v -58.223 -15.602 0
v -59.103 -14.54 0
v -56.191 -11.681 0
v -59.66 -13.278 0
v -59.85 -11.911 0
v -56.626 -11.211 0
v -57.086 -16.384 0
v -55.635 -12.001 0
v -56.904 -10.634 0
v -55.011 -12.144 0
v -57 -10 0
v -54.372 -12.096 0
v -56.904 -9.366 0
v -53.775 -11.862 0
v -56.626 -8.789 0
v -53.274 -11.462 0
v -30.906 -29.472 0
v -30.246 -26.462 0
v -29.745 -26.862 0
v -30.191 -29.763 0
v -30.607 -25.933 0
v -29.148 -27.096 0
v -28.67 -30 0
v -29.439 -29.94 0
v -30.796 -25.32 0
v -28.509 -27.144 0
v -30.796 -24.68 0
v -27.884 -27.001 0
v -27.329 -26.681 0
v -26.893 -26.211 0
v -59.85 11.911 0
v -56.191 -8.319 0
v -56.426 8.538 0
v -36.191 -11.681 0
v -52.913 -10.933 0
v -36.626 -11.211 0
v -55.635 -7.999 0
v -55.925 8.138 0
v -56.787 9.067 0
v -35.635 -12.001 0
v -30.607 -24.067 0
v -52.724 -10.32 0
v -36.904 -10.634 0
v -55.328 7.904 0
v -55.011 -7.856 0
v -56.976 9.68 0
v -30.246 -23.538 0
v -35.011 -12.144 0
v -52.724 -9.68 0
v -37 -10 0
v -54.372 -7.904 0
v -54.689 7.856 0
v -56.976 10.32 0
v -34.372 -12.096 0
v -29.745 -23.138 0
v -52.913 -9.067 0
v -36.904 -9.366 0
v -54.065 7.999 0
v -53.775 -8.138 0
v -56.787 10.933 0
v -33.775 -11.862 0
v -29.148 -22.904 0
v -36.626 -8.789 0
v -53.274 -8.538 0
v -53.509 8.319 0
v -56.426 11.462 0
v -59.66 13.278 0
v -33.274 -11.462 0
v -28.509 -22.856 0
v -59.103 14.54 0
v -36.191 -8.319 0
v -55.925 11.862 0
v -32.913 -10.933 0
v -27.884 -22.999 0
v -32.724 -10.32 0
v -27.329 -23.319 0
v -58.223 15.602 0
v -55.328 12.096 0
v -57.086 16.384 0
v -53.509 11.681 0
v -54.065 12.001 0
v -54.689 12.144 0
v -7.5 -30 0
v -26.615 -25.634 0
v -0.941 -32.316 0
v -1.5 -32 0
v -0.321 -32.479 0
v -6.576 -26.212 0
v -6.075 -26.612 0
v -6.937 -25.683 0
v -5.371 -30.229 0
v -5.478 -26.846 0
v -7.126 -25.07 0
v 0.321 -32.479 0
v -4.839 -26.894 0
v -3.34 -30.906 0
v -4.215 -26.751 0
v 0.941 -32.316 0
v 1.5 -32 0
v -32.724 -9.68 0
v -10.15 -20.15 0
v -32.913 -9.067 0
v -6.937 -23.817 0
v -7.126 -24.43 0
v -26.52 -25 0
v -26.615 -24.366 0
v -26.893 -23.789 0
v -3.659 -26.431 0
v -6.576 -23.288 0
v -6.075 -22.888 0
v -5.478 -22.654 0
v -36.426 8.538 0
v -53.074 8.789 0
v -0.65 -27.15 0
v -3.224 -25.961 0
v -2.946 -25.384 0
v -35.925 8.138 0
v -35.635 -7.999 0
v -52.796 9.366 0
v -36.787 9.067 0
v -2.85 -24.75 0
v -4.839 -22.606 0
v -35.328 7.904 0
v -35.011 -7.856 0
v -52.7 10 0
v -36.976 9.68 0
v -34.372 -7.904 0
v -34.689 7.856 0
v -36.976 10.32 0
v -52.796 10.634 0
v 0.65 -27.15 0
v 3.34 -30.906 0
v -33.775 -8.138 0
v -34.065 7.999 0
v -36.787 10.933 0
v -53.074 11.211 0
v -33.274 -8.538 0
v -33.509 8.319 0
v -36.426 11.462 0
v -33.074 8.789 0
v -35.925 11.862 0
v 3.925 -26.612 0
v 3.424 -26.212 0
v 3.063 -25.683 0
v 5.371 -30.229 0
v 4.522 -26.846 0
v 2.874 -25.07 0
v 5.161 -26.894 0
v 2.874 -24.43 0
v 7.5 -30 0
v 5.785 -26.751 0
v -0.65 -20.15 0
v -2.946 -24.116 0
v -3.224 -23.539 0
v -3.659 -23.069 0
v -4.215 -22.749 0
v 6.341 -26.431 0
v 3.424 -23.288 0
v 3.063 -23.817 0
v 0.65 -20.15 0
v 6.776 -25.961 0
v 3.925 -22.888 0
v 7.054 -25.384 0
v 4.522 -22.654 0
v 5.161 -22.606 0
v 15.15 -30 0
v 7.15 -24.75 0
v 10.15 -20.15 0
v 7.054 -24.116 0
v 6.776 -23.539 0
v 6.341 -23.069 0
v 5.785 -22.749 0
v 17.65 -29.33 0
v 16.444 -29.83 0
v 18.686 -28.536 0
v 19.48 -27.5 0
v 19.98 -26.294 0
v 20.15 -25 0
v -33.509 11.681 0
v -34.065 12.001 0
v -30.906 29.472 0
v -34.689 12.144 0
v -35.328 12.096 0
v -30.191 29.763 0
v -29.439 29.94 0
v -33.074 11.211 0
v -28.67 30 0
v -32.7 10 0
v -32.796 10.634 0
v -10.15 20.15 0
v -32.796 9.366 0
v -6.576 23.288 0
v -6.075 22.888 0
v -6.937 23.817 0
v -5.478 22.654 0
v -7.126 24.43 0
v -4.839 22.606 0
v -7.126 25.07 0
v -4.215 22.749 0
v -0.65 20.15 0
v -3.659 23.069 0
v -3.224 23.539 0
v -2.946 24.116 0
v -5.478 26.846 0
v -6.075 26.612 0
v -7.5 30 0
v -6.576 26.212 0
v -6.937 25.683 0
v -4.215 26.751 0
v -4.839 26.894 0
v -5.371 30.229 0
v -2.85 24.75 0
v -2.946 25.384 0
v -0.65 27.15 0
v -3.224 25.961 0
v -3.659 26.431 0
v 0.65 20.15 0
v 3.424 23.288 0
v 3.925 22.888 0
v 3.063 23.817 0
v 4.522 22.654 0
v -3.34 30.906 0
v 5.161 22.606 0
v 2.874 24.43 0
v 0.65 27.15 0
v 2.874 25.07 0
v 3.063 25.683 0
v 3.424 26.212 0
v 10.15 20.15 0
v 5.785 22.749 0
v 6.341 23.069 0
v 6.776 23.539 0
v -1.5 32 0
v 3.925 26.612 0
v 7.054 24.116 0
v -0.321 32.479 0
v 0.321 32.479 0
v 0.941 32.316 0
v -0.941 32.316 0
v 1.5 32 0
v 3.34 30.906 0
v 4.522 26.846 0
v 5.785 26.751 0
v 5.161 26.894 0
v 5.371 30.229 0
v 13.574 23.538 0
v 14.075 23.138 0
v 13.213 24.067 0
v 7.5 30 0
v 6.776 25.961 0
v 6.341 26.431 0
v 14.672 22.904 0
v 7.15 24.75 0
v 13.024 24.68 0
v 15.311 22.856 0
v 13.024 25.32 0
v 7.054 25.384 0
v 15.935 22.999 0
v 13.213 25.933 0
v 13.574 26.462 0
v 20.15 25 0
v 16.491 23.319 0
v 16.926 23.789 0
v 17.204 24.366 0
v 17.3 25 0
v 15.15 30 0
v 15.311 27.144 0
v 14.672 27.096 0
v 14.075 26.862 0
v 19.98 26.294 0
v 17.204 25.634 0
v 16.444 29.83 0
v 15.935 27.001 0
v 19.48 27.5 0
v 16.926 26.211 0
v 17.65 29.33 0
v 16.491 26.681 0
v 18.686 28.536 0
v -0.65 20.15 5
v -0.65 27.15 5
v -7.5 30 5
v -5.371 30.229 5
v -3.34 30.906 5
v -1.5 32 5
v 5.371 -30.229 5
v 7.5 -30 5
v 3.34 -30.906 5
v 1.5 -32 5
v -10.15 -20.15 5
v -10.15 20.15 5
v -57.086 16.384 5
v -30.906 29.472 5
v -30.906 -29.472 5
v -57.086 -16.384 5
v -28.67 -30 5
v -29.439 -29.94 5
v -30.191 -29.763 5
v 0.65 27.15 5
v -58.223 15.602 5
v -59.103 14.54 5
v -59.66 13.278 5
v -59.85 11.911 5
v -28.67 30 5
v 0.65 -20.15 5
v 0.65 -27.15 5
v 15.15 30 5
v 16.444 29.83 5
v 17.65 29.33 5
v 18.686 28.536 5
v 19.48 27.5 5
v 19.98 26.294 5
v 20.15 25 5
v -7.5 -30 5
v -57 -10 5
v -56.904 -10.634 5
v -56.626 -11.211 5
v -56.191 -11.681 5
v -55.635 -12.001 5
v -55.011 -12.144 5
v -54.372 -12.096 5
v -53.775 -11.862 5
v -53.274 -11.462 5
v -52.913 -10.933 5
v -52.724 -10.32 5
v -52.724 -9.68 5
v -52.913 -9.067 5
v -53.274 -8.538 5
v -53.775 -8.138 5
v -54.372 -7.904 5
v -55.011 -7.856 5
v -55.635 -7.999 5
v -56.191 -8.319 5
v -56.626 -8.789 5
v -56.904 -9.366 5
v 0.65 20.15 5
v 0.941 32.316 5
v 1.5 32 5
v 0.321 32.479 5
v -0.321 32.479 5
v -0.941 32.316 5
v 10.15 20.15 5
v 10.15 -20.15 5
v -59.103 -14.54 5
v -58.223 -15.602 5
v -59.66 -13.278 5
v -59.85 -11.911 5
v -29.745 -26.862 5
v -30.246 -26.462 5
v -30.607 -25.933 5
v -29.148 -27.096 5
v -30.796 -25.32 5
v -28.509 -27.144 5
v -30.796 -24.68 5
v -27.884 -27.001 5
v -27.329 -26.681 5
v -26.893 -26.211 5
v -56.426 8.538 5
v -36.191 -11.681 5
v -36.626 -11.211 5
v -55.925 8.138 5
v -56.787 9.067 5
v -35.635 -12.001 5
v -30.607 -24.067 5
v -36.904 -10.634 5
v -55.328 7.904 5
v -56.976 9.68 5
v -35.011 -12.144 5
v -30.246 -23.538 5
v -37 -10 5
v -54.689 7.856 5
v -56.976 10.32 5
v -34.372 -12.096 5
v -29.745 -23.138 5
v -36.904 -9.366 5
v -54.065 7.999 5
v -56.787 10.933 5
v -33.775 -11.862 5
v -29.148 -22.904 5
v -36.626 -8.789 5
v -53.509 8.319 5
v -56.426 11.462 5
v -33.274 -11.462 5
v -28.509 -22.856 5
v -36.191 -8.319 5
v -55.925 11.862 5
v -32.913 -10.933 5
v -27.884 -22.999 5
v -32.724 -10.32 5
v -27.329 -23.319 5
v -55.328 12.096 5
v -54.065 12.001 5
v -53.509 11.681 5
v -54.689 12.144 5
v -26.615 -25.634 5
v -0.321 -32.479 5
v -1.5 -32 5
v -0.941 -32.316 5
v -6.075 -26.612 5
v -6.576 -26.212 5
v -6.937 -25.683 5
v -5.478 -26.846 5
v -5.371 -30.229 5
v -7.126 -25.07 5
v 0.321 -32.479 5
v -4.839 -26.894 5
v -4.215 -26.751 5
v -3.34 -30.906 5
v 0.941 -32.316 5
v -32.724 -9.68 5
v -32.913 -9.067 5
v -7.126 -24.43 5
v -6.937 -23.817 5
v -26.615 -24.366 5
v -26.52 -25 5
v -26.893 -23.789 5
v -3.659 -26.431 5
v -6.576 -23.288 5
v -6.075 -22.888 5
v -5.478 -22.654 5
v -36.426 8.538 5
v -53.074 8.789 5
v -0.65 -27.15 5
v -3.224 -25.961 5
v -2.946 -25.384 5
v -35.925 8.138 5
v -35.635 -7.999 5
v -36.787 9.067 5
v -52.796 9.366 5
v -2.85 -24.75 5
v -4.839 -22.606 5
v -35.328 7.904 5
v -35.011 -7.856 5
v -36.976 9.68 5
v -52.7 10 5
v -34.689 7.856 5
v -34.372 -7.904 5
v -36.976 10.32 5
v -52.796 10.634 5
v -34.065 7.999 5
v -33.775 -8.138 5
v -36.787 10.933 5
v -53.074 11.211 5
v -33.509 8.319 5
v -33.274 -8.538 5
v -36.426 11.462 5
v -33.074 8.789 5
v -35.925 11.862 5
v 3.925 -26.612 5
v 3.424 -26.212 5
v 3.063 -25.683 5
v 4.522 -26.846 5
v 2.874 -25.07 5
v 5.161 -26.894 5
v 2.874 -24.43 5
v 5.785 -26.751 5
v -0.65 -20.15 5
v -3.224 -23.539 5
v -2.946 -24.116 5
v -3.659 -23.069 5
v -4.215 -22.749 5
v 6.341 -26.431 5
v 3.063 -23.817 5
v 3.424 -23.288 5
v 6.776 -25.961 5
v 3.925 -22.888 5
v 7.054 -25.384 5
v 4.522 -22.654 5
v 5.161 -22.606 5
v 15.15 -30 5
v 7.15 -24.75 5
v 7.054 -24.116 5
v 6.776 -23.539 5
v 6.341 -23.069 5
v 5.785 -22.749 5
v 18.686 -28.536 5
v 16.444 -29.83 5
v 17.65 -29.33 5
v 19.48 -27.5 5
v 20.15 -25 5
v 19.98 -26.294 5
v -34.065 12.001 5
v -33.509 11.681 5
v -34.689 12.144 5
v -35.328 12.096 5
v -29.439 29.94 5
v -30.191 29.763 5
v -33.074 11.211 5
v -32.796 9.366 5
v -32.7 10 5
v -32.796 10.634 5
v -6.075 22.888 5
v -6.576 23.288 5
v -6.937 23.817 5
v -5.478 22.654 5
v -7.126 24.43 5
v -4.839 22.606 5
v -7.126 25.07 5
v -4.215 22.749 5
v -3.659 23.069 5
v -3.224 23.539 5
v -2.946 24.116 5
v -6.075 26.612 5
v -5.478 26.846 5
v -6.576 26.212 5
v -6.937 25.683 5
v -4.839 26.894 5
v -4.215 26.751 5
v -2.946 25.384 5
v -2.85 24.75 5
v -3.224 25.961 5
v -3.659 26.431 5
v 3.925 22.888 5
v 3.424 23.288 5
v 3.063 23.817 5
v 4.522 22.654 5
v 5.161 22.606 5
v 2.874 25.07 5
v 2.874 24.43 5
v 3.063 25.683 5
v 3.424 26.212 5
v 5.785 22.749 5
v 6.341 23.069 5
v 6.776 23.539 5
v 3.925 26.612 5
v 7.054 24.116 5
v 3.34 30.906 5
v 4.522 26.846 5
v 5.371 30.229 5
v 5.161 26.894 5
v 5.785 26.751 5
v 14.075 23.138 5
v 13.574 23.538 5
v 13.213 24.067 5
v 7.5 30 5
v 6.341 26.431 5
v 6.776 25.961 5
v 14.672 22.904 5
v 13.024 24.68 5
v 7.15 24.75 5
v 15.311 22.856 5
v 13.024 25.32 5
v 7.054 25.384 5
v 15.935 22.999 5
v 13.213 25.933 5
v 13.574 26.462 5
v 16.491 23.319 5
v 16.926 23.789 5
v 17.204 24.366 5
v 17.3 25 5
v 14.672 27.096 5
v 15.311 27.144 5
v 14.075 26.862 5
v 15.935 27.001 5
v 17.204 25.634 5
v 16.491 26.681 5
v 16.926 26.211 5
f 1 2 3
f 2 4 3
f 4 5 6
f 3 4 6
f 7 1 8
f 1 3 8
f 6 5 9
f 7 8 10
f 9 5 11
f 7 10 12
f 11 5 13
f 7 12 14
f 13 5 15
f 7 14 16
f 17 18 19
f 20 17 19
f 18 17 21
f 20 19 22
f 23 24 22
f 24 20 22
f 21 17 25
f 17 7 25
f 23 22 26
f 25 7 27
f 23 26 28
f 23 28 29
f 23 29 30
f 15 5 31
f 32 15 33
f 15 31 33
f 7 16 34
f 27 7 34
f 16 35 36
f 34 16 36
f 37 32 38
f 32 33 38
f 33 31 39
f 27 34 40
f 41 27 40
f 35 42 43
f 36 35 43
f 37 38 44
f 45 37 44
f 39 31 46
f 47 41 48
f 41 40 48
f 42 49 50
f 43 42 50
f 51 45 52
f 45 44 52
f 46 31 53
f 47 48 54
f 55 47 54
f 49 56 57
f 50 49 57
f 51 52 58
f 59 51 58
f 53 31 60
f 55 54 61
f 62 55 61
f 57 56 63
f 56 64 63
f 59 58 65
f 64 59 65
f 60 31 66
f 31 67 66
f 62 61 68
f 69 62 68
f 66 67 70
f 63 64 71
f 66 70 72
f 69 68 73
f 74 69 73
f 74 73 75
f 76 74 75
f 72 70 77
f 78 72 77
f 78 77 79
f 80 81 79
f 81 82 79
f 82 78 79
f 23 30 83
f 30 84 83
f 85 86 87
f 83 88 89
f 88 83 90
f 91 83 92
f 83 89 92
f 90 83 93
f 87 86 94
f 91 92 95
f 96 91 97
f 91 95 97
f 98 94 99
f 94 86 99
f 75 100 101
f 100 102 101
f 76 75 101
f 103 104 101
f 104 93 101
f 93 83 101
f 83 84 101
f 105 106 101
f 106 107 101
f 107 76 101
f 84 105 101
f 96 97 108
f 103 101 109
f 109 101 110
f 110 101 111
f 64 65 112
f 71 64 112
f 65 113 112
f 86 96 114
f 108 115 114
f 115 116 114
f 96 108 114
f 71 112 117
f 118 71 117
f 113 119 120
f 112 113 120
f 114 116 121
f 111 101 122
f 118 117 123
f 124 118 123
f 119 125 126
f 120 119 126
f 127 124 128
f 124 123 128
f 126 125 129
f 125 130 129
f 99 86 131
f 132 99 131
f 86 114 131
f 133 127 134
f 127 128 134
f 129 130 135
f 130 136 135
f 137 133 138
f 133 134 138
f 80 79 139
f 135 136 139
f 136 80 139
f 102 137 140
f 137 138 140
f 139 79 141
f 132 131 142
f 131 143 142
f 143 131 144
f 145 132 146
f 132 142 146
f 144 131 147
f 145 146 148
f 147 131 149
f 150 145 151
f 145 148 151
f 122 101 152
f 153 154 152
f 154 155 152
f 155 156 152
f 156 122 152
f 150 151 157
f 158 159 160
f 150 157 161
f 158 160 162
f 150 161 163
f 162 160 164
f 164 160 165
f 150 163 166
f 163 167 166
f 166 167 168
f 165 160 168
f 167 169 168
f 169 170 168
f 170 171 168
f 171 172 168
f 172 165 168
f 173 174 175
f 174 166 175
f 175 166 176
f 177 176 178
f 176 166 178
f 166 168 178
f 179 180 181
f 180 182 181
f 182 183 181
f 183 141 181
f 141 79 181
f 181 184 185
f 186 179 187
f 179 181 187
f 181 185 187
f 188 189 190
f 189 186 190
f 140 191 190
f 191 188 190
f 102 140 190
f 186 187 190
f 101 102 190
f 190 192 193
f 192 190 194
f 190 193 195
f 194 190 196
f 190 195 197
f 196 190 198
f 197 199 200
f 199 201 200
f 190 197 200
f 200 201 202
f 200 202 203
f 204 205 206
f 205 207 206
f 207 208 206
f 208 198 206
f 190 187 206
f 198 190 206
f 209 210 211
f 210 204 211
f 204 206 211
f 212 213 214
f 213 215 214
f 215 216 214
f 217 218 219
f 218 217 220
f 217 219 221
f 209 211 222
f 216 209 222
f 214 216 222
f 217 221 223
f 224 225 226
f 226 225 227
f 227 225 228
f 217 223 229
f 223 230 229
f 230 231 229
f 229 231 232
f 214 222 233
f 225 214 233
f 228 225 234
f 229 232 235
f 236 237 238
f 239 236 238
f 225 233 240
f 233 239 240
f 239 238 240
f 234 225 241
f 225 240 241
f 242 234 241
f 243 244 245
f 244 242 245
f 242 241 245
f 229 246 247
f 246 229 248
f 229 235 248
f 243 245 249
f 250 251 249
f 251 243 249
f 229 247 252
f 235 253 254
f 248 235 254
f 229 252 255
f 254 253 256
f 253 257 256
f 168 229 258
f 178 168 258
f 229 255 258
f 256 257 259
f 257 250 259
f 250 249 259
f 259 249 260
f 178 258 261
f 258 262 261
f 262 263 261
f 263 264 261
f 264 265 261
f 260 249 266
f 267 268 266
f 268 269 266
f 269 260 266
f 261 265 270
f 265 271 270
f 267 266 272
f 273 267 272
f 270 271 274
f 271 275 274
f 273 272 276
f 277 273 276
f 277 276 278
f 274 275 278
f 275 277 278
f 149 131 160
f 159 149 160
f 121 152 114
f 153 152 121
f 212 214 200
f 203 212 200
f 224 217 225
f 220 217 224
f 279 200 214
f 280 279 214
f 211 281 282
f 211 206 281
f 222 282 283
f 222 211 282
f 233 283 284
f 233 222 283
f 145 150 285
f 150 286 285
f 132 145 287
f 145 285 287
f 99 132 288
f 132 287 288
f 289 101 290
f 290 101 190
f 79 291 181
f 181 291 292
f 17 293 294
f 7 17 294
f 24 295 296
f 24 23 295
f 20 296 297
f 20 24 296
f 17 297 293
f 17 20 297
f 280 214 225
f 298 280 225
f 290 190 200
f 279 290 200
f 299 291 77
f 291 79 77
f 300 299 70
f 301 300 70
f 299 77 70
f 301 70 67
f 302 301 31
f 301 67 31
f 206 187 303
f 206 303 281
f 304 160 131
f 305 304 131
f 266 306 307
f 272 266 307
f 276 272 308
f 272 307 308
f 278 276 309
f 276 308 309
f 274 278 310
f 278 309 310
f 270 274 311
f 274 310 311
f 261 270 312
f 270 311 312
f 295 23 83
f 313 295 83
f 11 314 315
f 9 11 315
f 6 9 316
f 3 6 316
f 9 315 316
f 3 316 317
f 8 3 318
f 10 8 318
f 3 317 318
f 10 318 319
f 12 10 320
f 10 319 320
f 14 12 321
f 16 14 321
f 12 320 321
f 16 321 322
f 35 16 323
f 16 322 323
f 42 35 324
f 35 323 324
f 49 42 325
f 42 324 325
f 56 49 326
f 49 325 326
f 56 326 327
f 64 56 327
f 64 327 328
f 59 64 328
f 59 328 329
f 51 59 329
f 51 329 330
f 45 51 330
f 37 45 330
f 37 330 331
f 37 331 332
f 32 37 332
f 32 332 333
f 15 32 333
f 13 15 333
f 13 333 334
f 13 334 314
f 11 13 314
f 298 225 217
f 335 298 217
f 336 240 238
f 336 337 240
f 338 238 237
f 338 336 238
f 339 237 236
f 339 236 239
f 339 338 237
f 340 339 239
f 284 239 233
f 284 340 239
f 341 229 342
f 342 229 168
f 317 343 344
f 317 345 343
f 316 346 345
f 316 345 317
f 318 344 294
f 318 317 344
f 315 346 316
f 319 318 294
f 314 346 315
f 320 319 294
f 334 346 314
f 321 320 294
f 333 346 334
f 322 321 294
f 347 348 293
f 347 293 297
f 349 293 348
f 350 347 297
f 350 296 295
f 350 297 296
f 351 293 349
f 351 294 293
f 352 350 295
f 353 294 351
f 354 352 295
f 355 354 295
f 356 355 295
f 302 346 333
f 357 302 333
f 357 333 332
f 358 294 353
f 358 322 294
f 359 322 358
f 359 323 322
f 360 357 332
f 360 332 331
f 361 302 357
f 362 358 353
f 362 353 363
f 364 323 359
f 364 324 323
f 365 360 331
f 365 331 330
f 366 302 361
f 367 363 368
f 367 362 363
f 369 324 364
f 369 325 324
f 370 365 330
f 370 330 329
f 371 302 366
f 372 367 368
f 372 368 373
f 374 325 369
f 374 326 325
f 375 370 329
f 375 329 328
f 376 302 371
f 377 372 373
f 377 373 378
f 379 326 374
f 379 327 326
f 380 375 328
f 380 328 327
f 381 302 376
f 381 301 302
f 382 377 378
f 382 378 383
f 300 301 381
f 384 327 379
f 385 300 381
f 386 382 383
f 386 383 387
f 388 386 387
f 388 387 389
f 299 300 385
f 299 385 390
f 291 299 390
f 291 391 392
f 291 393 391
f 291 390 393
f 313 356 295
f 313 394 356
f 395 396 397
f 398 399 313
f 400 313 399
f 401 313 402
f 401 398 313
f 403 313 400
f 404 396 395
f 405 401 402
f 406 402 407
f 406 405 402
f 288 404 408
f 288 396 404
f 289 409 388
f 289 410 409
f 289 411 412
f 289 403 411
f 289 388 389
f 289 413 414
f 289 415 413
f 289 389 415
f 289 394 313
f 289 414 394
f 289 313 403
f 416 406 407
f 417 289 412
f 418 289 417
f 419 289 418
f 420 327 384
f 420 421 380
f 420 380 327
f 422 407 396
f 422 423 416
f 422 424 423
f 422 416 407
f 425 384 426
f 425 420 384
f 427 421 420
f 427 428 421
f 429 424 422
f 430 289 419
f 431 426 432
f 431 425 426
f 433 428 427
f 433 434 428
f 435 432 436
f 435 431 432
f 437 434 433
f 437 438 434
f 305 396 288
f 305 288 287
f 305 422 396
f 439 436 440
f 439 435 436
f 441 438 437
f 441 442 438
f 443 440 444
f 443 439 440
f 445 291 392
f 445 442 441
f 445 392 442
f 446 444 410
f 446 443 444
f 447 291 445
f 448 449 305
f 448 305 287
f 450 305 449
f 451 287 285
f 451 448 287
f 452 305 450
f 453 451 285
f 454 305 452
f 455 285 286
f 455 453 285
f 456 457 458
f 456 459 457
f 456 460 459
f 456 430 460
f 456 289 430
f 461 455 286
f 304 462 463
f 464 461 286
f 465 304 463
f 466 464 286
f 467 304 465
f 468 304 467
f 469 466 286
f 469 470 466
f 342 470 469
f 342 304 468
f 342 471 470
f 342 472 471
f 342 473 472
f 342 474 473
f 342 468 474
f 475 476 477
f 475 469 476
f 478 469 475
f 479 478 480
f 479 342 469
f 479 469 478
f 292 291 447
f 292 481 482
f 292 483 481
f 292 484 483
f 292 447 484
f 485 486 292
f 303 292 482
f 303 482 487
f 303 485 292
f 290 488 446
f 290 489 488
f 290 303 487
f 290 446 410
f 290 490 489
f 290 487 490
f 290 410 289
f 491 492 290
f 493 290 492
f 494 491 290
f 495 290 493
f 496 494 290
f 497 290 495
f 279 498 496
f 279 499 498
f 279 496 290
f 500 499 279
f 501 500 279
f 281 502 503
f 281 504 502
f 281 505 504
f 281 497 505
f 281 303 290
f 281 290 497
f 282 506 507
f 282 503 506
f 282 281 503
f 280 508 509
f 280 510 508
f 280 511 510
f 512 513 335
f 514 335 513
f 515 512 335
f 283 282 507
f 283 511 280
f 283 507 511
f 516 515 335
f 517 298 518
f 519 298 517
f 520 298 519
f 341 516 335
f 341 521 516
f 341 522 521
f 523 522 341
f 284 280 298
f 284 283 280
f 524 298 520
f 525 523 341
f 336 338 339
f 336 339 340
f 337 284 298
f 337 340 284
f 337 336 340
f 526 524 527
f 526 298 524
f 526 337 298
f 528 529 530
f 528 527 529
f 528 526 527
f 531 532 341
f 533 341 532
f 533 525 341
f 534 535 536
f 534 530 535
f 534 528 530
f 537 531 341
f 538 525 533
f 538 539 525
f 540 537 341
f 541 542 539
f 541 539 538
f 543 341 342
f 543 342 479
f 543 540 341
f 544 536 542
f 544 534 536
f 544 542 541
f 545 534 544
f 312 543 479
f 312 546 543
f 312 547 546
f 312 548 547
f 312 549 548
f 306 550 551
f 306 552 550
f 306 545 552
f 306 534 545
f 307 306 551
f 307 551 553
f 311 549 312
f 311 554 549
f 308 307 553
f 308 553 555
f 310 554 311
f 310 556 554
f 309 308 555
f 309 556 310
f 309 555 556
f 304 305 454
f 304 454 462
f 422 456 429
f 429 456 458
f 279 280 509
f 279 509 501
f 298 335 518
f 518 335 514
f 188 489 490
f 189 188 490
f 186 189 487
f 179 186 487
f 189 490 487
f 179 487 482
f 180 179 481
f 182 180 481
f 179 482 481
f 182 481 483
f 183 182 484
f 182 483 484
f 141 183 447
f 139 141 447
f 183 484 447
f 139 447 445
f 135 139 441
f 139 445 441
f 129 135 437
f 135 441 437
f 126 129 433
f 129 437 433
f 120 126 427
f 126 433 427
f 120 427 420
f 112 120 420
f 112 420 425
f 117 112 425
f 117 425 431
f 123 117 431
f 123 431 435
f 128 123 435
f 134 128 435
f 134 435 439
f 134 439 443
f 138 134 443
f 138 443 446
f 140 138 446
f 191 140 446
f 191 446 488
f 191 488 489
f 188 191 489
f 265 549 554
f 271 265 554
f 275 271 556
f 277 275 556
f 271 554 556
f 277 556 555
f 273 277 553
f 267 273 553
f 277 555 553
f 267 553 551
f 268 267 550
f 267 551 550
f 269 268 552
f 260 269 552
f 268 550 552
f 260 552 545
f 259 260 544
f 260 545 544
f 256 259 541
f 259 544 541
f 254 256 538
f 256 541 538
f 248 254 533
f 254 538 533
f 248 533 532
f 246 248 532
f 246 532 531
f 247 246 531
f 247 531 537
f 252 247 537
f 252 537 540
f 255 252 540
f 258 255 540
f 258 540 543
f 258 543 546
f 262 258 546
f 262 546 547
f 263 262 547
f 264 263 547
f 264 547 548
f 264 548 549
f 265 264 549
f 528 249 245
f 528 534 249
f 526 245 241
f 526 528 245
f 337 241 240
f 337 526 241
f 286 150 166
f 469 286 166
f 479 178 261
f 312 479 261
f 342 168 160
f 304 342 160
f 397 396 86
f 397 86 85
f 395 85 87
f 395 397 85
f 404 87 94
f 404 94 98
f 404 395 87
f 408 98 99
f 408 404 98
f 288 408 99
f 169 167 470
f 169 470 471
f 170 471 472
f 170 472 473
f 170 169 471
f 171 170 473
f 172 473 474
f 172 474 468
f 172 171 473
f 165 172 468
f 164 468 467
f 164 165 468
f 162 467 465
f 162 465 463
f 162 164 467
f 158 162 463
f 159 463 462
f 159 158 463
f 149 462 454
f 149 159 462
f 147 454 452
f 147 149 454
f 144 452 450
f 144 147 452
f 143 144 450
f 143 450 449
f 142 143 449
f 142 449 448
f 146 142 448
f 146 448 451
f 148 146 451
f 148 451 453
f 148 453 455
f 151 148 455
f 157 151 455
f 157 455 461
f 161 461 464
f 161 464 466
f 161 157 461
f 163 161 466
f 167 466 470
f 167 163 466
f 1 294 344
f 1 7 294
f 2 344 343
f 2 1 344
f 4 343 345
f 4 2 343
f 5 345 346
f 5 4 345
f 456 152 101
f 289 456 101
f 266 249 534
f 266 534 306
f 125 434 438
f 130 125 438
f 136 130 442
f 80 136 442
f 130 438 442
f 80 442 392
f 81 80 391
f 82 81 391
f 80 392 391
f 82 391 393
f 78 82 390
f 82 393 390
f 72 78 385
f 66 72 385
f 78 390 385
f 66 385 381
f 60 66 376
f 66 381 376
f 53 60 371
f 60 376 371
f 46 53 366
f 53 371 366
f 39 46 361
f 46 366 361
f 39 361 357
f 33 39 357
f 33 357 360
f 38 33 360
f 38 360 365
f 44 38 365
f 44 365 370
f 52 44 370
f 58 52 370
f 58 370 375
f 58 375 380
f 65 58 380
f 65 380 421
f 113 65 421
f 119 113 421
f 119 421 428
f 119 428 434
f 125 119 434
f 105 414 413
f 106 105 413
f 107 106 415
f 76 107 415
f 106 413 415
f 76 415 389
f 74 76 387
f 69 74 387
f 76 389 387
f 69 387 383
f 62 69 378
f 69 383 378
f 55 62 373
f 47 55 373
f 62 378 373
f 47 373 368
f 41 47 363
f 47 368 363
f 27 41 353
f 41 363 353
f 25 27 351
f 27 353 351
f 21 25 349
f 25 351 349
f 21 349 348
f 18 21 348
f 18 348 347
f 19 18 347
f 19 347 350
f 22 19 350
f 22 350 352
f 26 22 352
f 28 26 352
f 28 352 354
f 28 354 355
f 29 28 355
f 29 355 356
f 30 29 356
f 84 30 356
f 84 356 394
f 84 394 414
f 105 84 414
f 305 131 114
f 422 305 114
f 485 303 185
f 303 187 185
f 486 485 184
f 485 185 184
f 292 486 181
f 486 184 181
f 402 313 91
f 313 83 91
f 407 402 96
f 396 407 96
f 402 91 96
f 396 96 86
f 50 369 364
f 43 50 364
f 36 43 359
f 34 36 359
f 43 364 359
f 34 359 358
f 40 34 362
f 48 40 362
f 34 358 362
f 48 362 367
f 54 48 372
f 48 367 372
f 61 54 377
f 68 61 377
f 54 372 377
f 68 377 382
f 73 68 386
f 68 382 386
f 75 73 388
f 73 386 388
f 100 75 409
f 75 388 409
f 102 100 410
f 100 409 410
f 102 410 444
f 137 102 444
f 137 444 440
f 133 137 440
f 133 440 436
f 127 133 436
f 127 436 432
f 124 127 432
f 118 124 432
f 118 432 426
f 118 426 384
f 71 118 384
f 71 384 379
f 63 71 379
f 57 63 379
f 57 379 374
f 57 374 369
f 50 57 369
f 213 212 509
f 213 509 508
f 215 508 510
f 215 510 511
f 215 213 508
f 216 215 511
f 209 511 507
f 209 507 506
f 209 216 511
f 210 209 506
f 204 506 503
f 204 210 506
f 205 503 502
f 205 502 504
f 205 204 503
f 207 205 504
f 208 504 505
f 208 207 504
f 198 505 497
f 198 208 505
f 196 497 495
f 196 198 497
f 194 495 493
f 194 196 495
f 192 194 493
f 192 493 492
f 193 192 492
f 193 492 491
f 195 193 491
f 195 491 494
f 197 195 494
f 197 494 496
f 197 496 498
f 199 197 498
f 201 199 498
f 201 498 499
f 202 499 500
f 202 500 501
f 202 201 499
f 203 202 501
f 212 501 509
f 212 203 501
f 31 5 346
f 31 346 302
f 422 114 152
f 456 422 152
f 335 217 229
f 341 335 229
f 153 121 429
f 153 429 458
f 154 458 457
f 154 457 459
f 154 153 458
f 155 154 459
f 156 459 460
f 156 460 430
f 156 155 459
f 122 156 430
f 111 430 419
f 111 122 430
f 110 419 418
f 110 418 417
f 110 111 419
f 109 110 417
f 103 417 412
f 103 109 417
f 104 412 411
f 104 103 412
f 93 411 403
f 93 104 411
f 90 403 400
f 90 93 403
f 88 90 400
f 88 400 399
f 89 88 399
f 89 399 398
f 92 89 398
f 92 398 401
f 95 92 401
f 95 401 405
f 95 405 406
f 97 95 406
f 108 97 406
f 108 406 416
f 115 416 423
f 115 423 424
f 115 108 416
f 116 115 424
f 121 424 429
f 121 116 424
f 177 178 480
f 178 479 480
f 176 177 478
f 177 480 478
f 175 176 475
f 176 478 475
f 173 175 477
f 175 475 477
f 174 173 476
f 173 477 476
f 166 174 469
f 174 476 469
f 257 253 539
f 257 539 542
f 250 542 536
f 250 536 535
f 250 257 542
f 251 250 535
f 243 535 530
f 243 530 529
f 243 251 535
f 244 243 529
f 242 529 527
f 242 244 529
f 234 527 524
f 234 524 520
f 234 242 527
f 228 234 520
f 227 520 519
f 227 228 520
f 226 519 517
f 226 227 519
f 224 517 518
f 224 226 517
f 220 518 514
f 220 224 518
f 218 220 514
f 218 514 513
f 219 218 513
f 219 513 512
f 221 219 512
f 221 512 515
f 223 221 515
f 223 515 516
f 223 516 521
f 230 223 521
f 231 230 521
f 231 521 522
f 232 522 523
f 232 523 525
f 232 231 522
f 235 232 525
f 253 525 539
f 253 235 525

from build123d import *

# Parameters (mm, degrees)
SKETCH_1_W          = 80
SKETCH_1_H          = 60
SKETCH_1_R          = 2.15
EXTRUDE_1_DEPTH     = 5
SKETCH_2_R          = 2.15
CUT_EXTRUDE_1_DEPTH = 68.134361545
SKETCH_3_R          = 2.15
CUT_EXTRUDE_2_DEPTH = 68.134361545
CUT_EXTRUDE_3_DEPTH = 68.134361545
FILLET_1_R          = 5
SKETCH_5_R          = 2.15
CUT_EXTRUDE_4_DEPTH = 68.134361545
FILLET_2_R          = 5
EXTRUDE_2_DEPTH     = 5
FILLET_3_R          = 10


with BuildPart() as part:
    # ｽｹｯﾁ1 → ﾎﾞｽ - 押し出し1 (new body)
    with BuildSketch(Plane.XY):
        with Locations((-19.85, 0)):
            Rectangle(SKETCH_1_W, SKETCH_1_H)
        with Locations((-5, -24.75)):
            Circle(SKETCH_1_R, mode=Mode.SUBTRACT)
        with Locations((5, -24.75)):
            Circle(SKETCH_1_R, mode=Mode.SUBTRACT)
        Polygon((0.65, -20.15), (0.65, -27.15), (-0.65, -27.15), (-0.65, -20.15), (-10.15, -20.15), (-10.15, 20.15), (-0.65, 20.15), (-0.65, 27.15), (0.65, 27.15), (0.65, 20.15), (10.15, 20.15), (10.15, -20.15), align=None, mode=Mode.SUBTRACT)
        with Locations((-5, 24.75)):
            Circle(SKETCH_1_R, mode=Mode.SUBTRACT)
        with Locations((5, 24.75)):
            Circle(SKETCH_1_R, mode=Mode.SUBTRACT)
    extrude(amount=EXTRUDE_1_DEPTH)

    # ｽｹｯﾁ2 → ｶｯﾄ - 押し出し1 (cut, through all)
    with BuildSketch(Plane.XY.offset(5)):
        with Locations((-54.85, 10)):
            Circle(SKETCH_2_R)
        with Locations(Location((-54.85, -10, 0), (0, 0, 180))):
            Circle(SKETCH_2_R)
        with Locations((-34.85, 10)):
            Circle(SKETCH_2_R)
        with Locations(Location((-34.85, -10, 0), (0, 0, 180))):
            Circle(SKETCH_2_R)
    extrude(amount=-CUT_EXTRUDE_1_DEPTH, mode=Mode.SUBTRACT)

    # ｽｹｯﾁ3 → ｶｯﾄ - 押し出し2 (cut, through all)
    with BuildSketch(Plane.XY.offset(5)):
        with Locations((15.15, 25)):
            Circle(SKETCH_3_R)
        with BuildLine():
            ThreePointArc((15.15, 30), (18.685533906, 28.535533906), (20.15, 25))
            Line((20.15, 25), (20.15, 30))
            Line((20.15, 30), (15.15, 30))
        make_face()
    extrude(amount=-CUT_EXTRUDE_2_DEPTH, mode=Mode.SUBTRACT)

    # ｽｹｯﾁ4 → ｶｯﾄ - 押し出し3 (cut, through all)
    with BuildSketch(Plane.XY.offset(5)):
        Polygon((-59.85, 30), (-59.85, 15.001700458), (-29.85, 30), align=None)
        Polygon((-29.85, -30), (-59.85, -15.001700458), (-59.85, -30), align=None)
    extrude(amount=-CUT_EXTRUDE_3_DEPTH, mode=Mode.SUBTRACT)

    # ﾌｨﾚｯﾄ1
    fillet_1_edges = [part.edges().sort_by_distance(p)[0] for p in [
        (20.15, -30, 2.5),
    ]]
    fillet(fillet_1_edges, radius=FILLET_1_R)

    # ｽｹｯﾁ5 → ｶｯﾄ - 押し出し4 (cut, through all)
    with BuildSketch(Plane.XY.offset(5)):
        with Locations((-28.669779796, -25)):
            Circle(SKETCH_5_R)
    extrude(amount=-CUT_EXTRUDE_4_DEPTH, mode=Mode.SUBTRACT)

    # ﾌｨﾚｯﾄ2
    fillet_2_edges = [part.edges().sort_by_distance(p)[0] for p in [
        (-59.85, 15.001700458, 2.5),
        (-29.85, 30, 2.5),
        (-59.85, -15.001700458, 2.5),
        (-29.85, -30, 2.5),
    ]]
    fillet(fillet_2_edges, radius=FILLET_2_R)

    # ｽｹｯﾁ6 → ﾎﾞｽ - 押し出し2 (add)
    with BuildSketch(Plane.XY.offset(5)):
        with BuildLine():
            ThreePointArc((2.5, 30), (0, 32.5), (-2.5, 30))
            Line((-2.5, 30), (2.5, 30))
        make_face()
        with BuildLine():
            Line((2.5, 30), (-2.5, 30))
            ThreePointArc((-2.5, 30), (0, 27.5), (2.5, 30))
        make_face()
        with BuildLine():
            ThreePointArc((2.5, -30), (0, -27.5), (-2.5, -30))
            Line((-2.5, -30), (2.5, -30))
        make_face()
        with BuildLine():
            Line((2.5, -30), (-2.5, -30))
            ThreePointArc((-2.5, -30), (0, -32.5), (2.5, -30))
        make_face()
    extrude(amount=-EXTRUDE_2_DEPTH)

    # ﾌｨﾚｯﾄ3
    fillet_3_edges = [part.edges().sort_by_distance(p)[0] for p in [
        (2.5, 30, 2.5),
        (-2.5, 30, 2.5),
        (2.5, -30, 2.5),
        (-2.5, -30, 2.5),
    ]]
    fillet(fillet_3_edges, radius=FILLET_3_R)


solid = part.part
